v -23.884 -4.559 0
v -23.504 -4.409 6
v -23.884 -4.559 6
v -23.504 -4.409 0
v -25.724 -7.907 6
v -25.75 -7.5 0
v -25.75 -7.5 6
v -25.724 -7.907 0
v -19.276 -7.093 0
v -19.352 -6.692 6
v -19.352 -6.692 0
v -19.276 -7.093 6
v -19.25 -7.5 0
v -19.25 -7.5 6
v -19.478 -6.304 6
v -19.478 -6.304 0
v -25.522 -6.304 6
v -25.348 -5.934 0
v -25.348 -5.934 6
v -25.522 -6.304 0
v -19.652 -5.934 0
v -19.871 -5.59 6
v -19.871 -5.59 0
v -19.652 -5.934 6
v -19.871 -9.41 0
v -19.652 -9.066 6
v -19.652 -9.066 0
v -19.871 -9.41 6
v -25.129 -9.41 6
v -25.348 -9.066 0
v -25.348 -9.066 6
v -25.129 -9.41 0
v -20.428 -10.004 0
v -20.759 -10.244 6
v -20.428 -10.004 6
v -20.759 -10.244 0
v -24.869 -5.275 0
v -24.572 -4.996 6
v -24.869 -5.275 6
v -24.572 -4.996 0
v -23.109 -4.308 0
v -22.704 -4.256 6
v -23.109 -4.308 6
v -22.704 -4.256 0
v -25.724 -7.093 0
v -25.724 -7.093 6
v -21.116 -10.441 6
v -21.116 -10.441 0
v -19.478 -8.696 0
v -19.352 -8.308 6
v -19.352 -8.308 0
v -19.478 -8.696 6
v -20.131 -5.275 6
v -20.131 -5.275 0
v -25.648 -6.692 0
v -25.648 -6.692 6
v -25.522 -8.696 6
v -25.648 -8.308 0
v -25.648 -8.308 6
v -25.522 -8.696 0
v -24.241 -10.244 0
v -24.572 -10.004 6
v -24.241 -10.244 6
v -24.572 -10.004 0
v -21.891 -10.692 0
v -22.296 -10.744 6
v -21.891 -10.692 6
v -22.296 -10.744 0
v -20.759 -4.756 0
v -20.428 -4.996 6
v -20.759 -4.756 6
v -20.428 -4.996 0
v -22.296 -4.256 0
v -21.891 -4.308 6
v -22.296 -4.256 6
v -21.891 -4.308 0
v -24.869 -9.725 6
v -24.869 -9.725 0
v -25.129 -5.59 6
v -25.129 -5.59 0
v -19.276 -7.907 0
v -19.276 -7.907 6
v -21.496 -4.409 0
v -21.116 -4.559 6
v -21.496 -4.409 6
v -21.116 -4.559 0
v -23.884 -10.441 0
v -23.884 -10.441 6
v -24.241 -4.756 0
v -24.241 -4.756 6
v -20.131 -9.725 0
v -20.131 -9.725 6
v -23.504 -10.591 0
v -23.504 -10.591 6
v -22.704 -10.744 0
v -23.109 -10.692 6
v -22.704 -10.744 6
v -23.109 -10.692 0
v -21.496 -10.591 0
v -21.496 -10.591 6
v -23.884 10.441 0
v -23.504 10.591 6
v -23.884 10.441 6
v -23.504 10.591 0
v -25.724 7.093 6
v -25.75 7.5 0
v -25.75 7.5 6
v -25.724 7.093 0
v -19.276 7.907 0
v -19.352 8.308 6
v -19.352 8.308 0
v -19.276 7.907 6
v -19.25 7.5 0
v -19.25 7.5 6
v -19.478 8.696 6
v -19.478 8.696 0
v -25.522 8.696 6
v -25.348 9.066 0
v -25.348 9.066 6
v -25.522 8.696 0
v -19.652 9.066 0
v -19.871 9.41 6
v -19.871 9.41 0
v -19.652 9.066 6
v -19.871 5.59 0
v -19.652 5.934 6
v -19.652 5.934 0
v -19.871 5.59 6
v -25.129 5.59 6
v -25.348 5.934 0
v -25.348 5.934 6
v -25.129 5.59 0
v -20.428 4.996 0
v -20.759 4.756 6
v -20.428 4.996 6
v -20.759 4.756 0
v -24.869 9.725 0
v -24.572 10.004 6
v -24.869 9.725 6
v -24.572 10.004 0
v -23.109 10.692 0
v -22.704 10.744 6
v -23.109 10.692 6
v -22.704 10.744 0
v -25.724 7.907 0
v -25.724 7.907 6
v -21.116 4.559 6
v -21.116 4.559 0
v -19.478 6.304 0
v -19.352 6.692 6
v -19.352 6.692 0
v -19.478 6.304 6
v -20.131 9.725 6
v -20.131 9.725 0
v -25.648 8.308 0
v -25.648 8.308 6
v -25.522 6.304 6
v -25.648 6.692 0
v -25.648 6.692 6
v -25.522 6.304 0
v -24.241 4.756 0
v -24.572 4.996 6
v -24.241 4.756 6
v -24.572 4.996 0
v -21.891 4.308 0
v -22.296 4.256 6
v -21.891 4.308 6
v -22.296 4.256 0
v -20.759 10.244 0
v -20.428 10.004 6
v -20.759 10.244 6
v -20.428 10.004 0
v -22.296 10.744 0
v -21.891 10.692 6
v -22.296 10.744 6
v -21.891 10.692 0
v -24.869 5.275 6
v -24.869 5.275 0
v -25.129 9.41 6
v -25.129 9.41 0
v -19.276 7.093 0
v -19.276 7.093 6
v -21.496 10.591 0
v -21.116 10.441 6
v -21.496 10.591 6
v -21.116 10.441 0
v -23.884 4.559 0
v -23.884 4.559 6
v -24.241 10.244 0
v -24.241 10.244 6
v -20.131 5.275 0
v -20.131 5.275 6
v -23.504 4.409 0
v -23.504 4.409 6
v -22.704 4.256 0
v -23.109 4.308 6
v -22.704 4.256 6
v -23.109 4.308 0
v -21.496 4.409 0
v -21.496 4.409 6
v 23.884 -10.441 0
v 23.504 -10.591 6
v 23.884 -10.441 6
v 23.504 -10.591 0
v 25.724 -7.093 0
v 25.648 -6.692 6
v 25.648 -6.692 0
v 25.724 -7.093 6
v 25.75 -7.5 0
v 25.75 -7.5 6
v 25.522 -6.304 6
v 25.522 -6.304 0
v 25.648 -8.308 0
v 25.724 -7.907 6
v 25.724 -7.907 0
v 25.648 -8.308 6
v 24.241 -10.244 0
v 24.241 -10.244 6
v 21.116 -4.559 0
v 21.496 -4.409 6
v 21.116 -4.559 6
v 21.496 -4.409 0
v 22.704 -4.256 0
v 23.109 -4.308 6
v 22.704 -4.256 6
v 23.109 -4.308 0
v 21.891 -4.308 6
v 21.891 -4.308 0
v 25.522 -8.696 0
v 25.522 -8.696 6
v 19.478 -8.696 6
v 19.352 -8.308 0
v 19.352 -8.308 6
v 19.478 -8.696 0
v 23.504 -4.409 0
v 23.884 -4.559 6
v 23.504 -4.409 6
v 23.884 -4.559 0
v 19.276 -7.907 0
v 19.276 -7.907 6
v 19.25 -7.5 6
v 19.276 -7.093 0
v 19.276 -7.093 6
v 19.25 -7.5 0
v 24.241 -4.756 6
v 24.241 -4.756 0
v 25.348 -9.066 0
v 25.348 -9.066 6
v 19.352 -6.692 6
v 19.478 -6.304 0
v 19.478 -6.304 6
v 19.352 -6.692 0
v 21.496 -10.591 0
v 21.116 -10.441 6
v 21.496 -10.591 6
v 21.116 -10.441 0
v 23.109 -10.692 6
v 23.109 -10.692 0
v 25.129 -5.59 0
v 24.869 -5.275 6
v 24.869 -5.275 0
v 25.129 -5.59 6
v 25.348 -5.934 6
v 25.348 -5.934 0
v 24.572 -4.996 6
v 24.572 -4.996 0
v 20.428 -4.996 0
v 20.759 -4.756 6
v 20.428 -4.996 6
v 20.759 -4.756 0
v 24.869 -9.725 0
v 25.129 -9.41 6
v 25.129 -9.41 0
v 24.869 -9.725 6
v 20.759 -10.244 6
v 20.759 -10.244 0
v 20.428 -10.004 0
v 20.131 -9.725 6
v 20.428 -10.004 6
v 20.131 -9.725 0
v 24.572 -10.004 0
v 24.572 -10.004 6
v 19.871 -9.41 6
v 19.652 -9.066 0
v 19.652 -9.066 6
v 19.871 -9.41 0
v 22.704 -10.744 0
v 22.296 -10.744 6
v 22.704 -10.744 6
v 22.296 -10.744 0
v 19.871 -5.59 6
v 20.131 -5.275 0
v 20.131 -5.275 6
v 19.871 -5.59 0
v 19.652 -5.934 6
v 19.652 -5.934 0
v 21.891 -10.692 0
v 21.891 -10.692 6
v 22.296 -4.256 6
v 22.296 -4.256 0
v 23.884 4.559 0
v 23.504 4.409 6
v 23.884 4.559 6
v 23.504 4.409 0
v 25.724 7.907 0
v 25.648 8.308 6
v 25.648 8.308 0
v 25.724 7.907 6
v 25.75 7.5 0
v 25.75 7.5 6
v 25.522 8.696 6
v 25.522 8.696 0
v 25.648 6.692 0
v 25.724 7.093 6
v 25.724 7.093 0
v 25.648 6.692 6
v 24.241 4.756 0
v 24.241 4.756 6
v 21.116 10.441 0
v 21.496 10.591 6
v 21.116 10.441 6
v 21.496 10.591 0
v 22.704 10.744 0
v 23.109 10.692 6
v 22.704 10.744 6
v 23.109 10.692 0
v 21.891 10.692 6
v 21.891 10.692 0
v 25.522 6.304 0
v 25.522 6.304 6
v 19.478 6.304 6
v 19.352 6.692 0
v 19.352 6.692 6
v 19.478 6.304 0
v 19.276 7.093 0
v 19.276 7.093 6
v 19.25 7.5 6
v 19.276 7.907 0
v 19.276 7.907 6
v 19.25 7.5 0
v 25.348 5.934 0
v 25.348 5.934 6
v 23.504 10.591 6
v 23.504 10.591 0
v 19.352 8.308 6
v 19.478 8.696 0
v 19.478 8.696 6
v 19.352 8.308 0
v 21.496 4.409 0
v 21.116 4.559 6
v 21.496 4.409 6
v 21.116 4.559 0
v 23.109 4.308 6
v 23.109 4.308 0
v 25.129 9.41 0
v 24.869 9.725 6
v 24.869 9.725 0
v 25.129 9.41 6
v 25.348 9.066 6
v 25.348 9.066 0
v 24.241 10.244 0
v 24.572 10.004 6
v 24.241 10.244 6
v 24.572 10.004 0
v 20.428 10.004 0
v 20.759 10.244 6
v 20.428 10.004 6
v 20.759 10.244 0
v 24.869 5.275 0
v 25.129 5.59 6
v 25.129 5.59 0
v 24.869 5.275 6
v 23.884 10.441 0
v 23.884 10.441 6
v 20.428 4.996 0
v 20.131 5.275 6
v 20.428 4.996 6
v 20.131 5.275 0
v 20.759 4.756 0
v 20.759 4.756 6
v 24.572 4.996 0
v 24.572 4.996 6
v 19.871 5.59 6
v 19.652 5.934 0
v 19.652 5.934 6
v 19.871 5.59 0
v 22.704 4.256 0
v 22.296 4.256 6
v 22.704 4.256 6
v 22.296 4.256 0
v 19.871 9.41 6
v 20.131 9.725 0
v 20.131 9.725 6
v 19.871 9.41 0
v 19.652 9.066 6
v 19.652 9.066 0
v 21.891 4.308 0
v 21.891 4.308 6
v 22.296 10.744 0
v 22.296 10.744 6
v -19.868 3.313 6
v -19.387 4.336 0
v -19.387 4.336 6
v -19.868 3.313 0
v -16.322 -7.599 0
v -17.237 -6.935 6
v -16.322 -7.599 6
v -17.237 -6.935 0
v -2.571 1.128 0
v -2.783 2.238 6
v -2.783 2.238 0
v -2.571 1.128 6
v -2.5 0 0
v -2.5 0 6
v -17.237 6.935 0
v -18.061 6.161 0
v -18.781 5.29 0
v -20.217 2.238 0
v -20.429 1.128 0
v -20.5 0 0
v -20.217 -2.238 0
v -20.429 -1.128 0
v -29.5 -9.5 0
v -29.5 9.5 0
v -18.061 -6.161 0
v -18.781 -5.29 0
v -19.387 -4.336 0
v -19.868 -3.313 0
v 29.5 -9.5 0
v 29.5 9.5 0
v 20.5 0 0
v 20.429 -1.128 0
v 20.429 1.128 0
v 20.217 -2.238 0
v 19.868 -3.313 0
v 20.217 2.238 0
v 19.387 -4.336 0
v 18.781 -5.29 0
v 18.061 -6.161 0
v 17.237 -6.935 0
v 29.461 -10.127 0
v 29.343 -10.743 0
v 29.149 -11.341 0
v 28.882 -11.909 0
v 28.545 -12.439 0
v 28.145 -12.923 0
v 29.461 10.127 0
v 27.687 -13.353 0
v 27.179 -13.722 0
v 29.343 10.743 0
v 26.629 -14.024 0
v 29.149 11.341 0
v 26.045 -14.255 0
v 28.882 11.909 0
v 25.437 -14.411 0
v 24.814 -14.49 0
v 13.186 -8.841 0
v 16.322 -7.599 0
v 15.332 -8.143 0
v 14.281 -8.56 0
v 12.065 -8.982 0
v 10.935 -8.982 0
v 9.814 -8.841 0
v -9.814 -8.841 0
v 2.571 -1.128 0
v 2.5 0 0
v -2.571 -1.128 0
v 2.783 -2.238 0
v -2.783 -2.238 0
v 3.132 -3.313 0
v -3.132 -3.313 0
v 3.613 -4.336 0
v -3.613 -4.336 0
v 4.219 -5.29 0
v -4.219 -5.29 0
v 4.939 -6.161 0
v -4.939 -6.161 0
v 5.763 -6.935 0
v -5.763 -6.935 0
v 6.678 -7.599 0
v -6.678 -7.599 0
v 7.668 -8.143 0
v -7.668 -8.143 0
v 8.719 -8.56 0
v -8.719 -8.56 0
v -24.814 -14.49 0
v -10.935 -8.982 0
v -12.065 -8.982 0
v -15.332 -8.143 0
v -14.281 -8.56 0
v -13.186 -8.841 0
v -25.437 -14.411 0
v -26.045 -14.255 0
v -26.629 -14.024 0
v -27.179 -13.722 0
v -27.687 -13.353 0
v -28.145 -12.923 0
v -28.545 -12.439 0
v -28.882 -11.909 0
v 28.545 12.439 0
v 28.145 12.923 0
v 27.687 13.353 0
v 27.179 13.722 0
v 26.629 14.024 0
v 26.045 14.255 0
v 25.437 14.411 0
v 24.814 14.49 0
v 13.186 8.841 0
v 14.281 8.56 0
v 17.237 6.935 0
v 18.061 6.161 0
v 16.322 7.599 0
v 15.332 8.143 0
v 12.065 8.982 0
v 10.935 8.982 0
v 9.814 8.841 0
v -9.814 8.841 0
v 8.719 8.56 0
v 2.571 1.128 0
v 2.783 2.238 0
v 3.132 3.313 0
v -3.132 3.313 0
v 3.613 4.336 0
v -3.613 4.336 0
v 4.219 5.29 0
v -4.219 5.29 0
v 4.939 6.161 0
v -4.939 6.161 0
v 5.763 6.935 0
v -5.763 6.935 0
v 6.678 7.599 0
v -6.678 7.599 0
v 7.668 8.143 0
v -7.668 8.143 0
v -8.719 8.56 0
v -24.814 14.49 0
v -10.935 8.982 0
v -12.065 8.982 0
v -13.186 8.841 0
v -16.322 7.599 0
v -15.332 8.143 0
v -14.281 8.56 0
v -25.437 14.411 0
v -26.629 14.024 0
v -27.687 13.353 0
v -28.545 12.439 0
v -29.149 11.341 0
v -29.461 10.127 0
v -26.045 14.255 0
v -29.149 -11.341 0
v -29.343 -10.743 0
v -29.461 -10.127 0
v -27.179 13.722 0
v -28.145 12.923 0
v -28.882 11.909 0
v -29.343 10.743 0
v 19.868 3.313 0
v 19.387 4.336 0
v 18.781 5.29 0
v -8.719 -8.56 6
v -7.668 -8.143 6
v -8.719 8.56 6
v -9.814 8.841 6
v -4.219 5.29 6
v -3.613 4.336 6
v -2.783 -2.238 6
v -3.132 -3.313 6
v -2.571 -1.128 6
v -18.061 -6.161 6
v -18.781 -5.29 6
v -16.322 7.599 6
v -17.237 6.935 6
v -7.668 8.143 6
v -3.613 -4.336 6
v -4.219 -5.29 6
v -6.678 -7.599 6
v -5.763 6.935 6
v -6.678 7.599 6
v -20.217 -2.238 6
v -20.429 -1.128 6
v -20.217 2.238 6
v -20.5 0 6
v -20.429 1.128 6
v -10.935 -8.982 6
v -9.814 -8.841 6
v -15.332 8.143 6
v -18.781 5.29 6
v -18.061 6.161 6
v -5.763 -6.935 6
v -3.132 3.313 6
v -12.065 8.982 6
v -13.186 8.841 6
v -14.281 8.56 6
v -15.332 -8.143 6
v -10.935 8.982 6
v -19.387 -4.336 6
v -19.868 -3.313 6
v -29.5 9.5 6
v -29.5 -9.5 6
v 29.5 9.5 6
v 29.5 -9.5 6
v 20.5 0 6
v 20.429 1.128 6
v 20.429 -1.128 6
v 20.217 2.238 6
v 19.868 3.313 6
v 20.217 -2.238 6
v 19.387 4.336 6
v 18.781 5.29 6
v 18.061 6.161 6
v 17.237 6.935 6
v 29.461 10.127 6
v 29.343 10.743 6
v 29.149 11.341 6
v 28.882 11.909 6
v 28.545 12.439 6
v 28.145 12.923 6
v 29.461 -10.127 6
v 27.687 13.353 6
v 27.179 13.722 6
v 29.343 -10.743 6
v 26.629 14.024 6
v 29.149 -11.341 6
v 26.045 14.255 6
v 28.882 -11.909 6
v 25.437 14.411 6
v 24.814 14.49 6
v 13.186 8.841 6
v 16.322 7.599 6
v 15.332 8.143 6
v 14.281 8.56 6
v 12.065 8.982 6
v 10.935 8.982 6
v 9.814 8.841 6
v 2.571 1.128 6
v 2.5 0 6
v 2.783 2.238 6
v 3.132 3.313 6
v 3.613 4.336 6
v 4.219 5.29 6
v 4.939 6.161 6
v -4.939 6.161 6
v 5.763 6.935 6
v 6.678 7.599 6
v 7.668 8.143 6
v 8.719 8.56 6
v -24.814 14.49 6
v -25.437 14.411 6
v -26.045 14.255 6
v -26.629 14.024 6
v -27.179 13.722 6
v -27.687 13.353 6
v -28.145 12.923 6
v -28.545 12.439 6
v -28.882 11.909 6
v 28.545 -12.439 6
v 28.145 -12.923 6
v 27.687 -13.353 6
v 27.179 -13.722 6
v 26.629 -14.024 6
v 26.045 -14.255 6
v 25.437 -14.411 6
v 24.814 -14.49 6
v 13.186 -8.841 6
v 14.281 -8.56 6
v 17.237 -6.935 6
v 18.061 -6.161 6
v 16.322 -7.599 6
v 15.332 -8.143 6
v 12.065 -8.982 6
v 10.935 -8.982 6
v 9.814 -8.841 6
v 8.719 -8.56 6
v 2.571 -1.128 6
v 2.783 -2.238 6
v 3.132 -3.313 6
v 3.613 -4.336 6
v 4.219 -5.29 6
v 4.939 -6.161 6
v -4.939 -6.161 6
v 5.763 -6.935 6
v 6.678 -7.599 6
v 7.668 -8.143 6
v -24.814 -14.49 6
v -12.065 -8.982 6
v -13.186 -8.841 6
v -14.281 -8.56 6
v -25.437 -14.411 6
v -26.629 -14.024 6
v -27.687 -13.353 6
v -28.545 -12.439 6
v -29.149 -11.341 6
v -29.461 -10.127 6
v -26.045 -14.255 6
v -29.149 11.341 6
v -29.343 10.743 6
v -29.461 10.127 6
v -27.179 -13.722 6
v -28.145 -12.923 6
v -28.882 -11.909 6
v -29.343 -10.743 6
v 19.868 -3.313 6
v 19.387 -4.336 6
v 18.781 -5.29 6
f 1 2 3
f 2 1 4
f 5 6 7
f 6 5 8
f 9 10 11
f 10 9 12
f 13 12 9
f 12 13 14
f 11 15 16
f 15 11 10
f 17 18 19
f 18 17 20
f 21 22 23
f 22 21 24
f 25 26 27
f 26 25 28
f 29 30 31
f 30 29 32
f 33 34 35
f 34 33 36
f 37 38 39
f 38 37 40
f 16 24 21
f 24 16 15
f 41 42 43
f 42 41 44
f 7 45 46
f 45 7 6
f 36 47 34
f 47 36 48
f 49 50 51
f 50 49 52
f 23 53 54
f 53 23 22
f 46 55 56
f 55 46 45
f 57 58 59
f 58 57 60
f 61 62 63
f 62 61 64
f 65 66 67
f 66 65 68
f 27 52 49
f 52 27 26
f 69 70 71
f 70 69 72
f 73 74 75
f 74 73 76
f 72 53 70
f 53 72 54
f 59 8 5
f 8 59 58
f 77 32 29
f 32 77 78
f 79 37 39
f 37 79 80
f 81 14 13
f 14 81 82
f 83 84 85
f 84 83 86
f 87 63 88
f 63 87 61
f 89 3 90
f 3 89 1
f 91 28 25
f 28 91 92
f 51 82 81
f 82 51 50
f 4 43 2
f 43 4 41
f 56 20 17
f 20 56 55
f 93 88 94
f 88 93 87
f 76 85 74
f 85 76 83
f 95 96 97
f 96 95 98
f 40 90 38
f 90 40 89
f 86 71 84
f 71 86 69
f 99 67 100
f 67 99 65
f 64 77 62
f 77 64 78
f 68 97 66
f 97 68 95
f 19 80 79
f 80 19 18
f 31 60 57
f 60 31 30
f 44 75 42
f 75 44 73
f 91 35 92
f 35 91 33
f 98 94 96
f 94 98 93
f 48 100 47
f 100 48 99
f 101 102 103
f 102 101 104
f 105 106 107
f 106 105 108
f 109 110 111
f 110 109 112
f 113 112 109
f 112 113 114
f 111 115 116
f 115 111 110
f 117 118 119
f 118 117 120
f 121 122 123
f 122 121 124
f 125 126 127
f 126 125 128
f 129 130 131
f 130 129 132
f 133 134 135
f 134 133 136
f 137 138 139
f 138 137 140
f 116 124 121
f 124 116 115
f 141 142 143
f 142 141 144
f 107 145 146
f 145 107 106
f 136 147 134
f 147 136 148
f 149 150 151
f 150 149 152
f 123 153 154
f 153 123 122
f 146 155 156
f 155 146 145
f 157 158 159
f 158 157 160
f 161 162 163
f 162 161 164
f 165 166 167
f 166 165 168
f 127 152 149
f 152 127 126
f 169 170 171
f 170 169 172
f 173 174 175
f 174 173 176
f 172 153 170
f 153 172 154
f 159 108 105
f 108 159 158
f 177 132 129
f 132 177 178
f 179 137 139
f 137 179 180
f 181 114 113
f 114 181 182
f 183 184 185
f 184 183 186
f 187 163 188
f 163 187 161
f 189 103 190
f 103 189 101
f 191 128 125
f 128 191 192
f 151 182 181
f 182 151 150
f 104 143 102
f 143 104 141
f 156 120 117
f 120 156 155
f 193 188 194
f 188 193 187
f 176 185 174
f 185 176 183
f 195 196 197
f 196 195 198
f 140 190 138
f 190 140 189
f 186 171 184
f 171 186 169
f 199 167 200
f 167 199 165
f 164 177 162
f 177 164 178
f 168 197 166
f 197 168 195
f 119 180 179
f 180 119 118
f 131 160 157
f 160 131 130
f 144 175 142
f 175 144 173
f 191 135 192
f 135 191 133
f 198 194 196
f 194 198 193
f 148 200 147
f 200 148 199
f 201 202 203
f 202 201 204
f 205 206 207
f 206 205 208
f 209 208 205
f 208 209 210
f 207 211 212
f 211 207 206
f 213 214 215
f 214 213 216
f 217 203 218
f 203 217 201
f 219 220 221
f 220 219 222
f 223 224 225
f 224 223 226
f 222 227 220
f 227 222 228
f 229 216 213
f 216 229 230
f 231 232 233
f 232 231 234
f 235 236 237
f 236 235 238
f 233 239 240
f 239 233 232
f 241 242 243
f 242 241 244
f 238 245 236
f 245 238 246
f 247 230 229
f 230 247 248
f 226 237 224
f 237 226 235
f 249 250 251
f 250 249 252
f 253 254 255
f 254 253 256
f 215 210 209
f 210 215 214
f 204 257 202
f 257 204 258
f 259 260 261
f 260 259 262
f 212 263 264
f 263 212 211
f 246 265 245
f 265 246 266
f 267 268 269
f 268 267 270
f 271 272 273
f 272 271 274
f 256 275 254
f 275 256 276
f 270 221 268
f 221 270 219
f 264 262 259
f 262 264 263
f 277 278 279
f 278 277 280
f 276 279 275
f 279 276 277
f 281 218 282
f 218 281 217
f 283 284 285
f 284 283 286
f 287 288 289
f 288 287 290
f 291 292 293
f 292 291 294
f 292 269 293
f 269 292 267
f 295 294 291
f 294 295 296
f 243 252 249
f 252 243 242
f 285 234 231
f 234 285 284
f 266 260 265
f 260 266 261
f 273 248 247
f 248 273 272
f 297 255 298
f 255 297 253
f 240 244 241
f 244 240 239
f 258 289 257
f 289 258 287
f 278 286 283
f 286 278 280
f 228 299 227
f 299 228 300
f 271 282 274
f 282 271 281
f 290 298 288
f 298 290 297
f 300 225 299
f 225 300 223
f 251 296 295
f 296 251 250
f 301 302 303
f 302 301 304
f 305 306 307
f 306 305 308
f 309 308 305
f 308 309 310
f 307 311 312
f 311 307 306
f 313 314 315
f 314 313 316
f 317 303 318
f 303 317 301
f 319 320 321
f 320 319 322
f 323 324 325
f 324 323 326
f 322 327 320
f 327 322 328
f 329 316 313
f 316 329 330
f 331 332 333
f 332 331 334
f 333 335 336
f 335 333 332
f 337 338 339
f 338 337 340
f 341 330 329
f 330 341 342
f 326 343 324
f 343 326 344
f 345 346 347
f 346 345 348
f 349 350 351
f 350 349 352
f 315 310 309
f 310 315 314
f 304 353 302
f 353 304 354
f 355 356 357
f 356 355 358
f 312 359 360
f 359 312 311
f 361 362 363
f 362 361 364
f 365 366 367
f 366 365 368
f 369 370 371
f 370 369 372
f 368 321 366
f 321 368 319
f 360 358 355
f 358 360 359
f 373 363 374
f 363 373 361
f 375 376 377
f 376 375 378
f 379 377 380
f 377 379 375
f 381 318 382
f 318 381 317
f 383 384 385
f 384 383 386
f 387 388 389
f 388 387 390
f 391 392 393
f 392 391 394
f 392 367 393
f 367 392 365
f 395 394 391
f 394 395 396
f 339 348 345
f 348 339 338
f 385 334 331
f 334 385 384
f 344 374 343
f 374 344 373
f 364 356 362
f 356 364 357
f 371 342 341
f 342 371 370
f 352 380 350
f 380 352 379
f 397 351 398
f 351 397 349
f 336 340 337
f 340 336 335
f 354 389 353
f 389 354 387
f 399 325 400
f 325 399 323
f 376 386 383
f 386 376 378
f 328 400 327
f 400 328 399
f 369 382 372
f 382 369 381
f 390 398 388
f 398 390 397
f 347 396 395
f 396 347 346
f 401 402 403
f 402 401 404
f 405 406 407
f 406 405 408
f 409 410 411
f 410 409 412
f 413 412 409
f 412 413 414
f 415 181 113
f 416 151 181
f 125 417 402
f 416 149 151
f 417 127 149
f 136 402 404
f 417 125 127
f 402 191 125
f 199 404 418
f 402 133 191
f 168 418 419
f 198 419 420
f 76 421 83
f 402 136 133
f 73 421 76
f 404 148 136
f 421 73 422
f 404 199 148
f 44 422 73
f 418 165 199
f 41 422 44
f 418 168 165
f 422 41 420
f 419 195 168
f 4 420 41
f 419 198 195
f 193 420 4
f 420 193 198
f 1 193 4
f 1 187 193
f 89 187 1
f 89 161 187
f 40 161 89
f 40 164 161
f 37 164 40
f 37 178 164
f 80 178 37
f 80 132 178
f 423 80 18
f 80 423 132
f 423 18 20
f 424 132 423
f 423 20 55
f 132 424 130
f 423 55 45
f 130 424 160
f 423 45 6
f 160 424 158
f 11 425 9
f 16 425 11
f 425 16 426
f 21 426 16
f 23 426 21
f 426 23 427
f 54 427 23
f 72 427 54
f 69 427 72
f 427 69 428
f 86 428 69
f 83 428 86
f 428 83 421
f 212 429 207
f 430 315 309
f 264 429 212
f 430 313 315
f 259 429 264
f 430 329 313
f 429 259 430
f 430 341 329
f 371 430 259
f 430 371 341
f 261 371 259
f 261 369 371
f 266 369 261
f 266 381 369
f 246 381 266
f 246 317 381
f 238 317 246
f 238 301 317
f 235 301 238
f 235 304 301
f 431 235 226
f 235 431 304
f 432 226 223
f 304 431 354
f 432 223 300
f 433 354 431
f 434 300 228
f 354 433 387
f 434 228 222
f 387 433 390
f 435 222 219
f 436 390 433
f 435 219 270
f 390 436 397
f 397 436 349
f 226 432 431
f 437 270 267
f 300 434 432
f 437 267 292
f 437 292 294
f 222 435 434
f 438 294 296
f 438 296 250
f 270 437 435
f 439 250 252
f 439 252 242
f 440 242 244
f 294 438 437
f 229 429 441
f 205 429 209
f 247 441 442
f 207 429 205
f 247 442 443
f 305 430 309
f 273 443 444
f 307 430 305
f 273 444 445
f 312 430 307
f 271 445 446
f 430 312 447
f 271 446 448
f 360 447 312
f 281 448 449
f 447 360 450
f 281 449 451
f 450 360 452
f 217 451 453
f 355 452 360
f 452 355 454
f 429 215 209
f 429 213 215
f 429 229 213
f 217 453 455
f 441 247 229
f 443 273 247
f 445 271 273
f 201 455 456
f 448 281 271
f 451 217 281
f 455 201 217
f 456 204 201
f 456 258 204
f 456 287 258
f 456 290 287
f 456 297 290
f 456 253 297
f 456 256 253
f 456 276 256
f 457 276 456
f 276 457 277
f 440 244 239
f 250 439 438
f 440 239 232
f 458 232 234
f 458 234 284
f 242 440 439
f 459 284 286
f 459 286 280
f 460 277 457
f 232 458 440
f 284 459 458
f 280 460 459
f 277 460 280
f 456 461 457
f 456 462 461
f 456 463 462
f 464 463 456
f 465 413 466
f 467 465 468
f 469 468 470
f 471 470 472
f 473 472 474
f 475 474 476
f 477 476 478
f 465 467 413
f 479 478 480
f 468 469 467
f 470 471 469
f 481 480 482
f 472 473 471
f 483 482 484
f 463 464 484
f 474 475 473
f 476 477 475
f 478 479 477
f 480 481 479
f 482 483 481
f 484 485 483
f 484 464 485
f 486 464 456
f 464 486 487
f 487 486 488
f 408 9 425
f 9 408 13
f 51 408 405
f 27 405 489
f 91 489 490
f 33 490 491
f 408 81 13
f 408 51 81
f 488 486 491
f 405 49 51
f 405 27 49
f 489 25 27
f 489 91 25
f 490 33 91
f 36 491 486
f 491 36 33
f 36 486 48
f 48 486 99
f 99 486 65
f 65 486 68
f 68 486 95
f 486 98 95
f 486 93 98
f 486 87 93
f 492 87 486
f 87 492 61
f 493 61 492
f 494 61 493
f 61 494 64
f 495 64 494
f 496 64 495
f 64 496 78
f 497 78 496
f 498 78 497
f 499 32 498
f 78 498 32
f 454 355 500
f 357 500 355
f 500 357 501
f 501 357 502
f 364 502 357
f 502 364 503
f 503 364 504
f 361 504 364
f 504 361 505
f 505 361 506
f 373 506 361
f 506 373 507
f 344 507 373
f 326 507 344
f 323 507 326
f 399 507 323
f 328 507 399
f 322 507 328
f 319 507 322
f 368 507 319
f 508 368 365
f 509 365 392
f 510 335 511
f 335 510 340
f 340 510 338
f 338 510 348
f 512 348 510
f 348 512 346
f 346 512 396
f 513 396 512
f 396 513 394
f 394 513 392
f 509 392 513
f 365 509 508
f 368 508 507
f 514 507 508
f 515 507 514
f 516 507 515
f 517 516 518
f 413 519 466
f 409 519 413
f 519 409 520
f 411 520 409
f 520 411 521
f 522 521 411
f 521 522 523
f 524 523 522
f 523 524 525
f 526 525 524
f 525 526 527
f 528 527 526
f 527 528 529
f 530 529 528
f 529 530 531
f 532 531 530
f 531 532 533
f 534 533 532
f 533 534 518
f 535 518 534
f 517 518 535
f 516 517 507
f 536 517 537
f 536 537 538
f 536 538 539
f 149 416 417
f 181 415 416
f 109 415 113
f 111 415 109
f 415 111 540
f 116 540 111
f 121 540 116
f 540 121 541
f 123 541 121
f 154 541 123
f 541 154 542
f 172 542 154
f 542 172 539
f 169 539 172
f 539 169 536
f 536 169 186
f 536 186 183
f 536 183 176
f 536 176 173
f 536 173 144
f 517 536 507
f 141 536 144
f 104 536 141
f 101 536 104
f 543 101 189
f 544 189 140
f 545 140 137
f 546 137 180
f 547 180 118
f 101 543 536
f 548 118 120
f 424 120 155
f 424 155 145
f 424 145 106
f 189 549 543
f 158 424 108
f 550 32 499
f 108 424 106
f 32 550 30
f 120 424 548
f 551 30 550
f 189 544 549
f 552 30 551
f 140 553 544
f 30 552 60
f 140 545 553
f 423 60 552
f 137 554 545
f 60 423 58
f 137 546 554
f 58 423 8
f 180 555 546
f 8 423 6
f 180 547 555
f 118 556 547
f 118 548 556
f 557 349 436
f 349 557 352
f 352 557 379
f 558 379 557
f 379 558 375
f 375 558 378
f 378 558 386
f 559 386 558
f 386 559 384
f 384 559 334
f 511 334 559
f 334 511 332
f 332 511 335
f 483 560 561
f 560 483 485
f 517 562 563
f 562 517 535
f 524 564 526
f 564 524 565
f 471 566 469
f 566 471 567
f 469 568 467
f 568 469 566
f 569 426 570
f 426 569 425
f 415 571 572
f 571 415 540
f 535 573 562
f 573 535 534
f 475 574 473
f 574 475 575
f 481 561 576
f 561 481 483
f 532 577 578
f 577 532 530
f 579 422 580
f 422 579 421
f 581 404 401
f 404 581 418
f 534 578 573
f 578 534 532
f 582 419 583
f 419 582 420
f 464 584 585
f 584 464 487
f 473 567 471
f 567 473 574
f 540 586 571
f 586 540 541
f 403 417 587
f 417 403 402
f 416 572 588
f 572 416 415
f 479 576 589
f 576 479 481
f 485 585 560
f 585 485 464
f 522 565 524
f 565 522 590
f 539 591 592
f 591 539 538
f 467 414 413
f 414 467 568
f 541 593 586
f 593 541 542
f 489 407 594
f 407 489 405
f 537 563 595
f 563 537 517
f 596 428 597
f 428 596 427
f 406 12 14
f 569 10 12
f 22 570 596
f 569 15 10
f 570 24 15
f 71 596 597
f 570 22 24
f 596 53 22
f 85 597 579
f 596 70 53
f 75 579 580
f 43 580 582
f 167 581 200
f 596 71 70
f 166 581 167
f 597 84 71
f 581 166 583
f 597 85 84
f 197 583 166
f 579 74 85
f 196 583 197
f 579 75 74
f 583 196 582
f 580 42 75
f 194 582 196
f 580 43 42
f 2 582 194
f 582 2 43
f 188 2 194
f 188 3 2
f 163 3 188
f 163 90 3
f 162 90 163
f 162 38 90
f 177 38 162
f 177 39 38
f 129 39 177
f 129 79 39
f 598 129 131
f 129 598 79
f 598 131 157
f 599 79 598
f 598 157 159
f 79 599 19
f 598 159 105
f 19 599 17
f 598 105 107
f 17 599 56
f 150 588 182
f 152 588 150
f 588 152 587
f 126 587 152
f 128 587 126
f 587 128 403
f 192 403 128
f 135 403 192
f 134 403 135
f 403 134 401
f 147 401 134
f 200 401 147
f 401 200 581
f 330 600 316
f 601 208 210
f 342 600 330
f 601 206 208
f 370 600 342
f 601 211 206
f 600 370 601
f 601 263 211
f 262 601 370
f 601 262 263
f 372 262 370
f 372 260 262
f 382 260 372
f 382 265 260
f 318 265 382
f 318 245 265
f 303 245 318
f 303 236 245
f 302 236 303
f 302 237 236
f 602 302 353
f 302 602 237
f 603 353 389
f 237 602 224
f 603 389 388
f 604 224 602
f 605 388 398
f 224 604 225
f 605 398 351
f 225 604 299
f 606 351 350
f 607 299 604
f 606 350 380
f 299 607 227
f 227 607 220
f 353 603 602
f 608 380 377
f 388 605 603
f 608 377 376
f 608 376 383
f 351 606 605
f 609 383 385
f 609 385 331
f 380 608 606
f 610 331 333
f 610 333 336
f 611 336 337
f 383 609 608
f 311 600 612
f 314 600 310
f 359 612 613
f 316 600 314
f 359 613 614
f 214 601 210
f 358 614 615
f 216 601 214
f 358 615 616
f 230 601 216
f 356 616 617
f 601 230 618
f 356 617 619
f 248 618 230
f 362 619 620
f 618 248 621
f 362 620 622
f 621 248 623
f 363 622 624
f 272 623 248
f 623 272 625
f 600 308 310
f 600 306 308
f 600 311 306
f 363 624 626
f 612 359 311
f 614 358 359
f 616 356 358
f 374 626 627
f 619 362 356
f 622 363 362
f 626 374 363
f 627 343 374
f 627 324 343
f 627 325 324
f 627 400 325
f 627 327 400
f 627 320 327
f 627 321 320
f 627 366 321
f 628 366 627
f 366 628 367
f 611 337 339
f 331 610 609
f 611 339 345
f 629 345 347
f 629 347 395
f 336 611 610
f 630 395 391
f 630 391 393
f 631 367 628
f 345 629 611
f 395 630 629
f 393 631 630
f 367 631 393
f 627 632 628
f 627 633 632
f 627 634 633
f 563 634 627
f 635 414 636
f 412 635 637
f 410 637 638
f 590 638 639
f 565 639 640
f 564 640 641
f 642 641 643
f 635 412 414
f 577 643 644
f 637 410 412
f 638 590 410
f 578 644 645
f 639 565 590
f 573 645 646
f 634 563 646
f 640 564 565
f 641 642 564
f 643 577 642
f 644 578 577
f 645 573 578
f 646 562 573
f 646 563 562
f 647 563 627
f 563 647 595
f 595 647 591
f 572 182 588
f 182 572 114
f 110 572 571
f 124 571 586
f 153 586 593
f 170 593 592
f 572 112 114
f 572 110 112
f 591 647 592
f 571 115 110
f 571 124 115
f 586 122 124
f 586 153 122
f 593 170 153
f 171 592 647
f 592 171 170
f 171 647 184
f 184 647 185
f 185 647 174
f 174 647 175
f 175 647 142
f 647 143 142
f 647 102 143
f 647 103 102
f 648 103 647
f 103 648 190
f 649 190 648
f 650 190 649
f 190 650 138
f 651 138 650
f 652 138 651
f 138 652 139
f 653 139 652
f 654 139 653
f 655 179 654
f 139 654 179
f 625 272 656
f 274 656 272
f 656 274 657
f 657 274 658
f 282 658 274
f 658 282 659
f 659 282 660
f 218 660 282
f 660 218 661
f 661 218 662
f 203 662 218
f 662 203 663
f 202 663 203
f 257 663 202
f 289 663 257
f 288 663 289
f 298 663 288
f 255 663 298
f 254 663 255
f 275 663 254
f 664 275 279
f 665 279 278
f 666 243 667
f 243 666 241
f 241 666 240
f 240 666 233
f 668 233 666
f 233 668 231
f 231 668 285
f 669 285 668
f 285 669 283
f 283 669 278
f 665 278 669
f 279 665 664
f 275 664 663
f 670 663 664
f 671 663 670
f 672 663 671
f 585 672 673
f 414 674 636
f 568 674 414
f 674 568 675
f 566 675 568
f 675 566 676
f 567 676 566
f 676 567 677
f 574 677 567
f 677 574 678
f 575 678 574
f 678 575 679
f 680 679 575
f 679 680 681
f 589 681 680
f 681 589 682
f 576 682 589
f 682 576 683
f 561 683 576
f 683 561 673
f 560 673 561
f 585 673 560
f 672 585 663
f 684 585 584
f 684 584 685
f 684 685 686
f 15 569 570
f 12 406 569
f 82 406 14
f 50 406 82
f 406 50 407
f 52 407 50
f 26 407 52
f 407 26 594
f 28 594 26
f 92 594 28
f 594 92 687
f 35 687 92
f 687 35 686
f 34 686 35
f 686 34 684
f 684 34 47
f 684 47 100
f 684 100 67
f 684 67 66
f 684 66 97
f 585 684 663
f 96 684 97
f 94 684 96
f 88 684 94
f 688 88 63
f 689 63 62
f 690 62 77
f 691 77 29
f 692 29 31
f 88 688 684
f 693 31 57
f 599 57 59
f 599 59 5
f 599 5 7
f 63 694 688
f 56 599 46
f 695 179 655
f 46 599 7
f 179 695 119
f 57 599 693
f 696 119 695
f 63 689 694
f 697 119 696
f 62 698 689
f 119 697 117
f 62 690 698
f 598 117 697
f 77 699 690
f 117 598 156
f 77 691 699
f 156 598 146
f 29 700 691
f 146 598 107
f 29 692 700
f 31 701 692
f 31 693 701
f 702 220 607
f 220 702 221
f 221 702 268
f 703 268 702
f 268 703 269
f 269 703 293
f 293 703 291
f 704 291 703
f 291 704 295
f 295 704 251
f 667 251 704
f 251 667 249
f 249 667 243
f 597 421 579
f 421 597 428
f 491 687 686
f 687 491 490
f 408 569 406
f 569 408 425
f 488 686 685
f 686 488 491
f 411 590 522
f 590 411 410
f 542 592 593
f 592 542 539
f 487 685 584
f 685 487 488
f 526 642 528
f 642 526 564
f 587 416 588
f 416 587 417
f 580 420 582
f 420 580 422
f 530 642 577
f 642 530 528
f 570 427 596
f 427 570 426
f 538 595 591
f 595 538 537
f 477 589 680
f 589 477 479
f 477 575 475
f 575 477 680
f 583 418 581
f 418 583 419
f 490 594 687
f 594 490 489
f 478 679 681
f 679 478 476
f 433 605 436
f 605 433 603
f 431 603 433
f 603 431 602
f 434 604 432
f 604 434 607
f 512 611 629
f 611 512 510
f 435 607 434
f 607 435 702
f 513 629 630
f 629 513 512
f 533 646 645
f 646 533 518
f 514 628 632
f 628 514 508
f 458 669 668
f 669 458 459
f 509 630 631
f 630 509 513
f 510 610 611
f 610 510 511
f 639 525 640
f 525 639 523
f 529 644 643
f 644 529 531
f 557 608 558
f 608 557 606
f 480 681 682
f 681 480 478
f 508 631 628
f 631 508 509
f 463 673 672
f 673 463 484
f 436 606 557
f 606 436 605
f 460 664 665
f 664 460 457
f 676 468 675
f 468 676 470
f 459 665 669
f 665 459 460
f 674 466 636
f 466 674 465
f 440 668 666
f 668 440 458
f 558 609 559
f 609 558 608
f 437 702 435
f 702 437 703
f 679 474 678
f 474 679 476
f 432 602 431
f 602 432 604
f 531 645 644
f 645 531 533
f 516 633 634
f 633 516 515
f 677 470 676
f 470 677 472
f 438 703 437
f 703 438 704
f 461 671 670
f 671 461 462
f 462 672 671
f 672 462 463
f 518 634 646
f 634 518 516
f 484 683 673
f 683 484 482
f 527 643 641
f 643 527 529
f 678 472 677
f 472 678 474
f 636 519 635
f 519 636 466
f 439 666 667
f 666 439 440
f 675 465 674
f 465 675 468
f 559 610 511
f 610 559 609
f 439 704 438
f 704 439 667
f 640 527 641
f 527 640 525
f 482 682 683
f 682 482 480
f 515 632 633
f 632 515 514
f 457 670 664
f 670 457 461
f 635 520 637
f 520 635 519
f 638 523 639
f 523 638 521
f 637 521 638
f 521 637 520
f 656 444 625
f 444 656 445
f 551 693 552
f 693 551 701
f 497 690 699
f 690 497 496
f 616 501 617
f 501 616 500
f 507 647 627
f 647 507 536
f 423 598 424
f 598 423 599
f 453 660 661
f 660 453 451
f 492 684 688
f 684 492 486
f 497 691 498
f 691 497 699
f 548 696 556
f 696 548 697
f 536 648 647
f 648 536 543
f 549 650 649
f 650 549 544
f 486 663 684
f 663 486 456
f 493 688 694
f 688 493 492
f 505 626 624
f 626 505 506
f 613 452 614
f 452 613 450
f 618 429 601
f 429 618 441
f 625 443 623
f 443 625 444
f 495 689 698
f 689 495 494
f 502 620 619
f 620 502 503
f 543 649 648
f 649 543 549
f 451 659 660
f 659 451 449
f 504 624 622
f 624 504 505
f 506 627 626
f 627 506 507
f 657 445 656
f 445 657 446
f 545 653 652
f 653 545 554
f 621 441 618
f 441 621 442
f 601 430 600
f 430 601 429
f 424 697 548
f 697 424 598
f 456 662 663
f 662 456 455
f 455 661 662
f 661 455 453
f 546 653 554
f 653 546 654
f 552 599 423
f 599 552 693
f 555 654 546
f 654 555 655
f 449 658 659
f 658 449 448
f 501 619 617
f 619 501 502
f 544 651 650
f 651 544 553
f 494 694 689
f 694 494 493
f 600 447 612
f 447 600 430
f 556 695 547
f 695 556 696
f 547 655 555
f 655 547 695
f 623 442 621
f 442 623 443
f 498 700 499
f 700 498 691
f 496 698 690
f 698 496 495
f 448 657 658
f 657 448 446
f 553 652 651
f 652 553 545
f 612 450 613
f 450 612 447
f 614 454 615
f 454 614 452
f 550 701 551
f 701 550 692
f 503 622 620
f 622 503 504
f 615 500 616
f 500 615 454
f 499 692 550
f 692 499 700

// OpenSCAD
$fn = 50;


difference() {
	union() {
		hull() {
			translate(v = [-24.5000000000, 9.5000000000, 0]) {
				cylinder(h = 6, r = 5);
			}
			translate(v = [24.5000000000, 9.5000000000, 0]) {
				cylinder(h = 6, r = 5);
			}
			translate(v = [-24.5000000000, -9.5000000000, 0]) {
				cylinder(h = 6, r = 5);
			}
			translate(v = [24.5000000000, -9.5000000000, 0]) {
				cylinder(h = 6, r = 5);
			}
		}
	}
	union() {
		#translate(v = [-22.5000000000, -7.5000000000, -100.0000000000]) {
			cylinder(h = 200, r = 3.2500000000);
		}
		#translate(v = [-22.5000000000, 7.5000000000, -100.0000000000]) {
			cylinder(h = 200, r = 3.2500000000);
		}
		#translate(v = [22.5000000000, -7.5000000000, -100.0000000000]) {
			cylinder(h = 200, r = 3.2500000000);
		}
		#translate(v = [22.5000000000, 7.5000000000, -100.0000000000]) {
			cylinder(h = 200, r = 3.2500000000);
		}
		#translate(v = [-11.5000000000, 0, 0]) {
			cylinder(h = 6, r = 9.0000000000);
		}
		#translate(v = [11.5000000000, 0, 0]) {
			cylinder(h = 6, r = 9.0000000000);
		}
	}
}
